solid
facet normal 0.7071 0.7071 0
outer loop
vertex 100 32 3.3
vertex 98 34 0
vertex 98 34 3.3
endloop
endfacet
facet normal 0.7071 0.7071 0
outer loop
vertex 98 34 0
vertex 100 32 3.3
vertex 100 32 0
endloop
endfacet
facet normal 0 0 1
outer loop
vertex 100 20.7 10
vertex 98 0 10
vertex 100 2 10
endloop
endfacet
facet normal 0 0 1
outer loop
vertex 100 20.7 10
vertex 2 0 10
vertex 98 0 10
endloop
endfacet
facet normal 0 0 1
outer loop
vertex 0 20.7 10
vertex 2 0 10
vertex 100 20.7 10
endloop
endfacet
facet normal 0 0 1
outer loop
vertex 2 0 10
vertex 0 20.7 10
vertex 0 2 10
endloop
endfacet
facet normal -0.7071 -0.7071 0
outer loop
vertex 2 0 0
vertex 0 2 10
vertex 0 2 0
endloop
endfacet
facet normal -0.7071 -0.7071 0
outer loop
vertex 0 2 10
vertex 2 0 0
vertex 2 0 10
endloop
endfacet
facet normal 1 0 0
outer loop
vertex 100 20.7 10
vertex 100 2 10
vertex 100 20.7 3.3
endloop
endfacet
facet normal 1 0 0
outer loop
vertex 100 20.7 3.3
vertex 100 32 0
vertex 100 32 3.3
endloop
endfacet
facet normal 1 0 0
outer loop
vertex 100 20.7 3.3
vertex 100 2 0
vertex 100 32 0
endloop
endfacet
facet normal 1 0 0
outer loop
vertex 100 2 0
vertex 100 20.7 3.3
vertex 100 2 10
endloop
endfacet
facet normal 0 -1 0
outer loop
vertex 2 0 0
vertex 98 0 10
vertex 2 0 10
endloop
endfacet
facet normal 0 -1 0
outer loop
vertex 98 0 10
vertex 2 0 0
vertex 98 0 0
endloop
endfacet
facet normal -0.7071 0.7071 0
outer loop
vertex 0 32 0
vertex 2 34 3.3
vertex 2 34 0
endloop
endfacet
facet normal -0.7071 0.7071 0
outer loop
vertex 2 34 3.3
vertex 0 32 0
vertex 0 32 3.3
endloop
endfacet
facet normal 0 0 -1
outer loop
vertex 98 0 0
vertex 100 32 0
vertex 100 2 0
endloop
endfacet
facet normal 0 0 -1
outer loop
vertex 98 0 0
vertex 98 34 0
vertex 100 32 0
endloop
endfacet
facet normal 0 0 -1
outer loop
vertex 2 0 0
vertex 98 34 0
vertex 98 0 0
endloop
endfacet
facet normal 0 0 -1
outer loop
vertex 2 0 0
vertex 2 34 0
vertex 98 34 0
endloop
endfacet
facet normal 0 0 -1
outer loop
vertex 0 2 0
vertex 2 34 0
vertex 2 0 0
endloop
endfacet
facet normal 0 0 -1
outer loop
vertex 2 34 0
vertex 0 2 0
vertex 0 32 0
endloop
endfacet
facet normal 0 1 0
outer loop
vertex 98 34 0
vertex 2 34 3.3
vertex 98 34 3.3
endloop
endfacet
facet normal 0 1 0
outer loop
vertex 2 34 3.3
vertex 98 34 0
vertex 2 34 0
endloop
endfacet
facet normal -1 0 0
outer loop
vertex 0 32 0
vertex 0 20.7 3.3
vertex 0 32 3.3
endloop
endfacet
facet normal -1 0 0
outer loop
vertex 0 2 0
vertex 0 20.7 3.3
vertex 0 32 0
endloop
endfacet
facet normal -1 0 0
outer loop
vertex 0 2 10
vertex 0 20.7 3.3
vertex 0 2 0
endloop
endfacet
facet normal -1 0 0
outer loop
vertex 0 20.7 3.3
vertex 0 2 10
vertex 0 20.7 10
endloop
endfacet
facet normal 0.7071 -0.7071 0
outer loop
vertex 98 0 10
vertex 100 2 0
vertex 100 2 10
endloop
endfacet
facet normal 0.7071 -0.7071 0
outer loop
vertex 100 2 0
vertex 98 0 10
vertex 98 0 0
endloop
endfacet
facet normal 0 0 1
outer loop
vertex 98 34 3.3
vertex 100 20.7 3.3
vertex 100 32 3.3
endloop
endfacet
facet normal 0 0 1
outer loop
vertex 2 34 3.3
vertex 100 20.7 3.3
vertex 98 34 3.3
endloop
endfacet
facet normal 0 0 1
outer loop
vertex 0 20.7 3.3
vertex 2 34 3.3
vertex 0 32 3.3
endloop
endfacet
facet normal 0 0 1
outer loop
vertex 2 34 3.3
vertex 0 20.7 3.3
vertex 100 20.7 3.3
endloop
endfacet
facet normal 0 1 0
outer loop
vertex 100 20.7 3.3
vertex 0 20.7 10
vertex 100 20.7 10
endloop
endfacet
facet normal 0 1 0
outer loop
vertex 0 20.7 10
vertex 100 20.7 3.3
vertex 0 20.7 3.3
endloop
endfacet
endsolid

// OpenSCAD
$fn = 32;

// ----------------------------------------------------------------------
// Stepped bar: sidestep, 100 x 34 x 10/3.3 mm
// ----------------------------------------------------------------------

// --- parameters (mm) ---
bar_l = 100;              // bar length, X
bar_w = 34;               // bar width, Y
plate_t = 10;             // thickness of the thick zone, Z
thin_t = 3.3;             // thickness of the thin zone
corner_c = 2;             // corner chamfer of the bar
step_cut = 6.7;           // material removed from the thin zone
ledge_y = 20.7;           // start of the ledge from the front edge
depth_1 = 6.7;            // depth of cut 1 from the top face

profile = [[2, 0], [98, 0], [100, 2], [100, 32], [98, 34], [2, 34], [0, 32], [0, 2]];  // primary outline, 8 points, counter clockwise
void_1 = [[-1, 20.7], [101, 20.7], [101, 35], [-1, 35]];  // ledge cut along one edge, 4 points

// --- the one profile operation ---
difference() {
  linear_extrude(height = plate_t) polygon(points = profile);
  translate([0, 0, plate_t - depth_1])
    linear_extrude(height = depth_1 + 1) polygon(points = void_1);
}
